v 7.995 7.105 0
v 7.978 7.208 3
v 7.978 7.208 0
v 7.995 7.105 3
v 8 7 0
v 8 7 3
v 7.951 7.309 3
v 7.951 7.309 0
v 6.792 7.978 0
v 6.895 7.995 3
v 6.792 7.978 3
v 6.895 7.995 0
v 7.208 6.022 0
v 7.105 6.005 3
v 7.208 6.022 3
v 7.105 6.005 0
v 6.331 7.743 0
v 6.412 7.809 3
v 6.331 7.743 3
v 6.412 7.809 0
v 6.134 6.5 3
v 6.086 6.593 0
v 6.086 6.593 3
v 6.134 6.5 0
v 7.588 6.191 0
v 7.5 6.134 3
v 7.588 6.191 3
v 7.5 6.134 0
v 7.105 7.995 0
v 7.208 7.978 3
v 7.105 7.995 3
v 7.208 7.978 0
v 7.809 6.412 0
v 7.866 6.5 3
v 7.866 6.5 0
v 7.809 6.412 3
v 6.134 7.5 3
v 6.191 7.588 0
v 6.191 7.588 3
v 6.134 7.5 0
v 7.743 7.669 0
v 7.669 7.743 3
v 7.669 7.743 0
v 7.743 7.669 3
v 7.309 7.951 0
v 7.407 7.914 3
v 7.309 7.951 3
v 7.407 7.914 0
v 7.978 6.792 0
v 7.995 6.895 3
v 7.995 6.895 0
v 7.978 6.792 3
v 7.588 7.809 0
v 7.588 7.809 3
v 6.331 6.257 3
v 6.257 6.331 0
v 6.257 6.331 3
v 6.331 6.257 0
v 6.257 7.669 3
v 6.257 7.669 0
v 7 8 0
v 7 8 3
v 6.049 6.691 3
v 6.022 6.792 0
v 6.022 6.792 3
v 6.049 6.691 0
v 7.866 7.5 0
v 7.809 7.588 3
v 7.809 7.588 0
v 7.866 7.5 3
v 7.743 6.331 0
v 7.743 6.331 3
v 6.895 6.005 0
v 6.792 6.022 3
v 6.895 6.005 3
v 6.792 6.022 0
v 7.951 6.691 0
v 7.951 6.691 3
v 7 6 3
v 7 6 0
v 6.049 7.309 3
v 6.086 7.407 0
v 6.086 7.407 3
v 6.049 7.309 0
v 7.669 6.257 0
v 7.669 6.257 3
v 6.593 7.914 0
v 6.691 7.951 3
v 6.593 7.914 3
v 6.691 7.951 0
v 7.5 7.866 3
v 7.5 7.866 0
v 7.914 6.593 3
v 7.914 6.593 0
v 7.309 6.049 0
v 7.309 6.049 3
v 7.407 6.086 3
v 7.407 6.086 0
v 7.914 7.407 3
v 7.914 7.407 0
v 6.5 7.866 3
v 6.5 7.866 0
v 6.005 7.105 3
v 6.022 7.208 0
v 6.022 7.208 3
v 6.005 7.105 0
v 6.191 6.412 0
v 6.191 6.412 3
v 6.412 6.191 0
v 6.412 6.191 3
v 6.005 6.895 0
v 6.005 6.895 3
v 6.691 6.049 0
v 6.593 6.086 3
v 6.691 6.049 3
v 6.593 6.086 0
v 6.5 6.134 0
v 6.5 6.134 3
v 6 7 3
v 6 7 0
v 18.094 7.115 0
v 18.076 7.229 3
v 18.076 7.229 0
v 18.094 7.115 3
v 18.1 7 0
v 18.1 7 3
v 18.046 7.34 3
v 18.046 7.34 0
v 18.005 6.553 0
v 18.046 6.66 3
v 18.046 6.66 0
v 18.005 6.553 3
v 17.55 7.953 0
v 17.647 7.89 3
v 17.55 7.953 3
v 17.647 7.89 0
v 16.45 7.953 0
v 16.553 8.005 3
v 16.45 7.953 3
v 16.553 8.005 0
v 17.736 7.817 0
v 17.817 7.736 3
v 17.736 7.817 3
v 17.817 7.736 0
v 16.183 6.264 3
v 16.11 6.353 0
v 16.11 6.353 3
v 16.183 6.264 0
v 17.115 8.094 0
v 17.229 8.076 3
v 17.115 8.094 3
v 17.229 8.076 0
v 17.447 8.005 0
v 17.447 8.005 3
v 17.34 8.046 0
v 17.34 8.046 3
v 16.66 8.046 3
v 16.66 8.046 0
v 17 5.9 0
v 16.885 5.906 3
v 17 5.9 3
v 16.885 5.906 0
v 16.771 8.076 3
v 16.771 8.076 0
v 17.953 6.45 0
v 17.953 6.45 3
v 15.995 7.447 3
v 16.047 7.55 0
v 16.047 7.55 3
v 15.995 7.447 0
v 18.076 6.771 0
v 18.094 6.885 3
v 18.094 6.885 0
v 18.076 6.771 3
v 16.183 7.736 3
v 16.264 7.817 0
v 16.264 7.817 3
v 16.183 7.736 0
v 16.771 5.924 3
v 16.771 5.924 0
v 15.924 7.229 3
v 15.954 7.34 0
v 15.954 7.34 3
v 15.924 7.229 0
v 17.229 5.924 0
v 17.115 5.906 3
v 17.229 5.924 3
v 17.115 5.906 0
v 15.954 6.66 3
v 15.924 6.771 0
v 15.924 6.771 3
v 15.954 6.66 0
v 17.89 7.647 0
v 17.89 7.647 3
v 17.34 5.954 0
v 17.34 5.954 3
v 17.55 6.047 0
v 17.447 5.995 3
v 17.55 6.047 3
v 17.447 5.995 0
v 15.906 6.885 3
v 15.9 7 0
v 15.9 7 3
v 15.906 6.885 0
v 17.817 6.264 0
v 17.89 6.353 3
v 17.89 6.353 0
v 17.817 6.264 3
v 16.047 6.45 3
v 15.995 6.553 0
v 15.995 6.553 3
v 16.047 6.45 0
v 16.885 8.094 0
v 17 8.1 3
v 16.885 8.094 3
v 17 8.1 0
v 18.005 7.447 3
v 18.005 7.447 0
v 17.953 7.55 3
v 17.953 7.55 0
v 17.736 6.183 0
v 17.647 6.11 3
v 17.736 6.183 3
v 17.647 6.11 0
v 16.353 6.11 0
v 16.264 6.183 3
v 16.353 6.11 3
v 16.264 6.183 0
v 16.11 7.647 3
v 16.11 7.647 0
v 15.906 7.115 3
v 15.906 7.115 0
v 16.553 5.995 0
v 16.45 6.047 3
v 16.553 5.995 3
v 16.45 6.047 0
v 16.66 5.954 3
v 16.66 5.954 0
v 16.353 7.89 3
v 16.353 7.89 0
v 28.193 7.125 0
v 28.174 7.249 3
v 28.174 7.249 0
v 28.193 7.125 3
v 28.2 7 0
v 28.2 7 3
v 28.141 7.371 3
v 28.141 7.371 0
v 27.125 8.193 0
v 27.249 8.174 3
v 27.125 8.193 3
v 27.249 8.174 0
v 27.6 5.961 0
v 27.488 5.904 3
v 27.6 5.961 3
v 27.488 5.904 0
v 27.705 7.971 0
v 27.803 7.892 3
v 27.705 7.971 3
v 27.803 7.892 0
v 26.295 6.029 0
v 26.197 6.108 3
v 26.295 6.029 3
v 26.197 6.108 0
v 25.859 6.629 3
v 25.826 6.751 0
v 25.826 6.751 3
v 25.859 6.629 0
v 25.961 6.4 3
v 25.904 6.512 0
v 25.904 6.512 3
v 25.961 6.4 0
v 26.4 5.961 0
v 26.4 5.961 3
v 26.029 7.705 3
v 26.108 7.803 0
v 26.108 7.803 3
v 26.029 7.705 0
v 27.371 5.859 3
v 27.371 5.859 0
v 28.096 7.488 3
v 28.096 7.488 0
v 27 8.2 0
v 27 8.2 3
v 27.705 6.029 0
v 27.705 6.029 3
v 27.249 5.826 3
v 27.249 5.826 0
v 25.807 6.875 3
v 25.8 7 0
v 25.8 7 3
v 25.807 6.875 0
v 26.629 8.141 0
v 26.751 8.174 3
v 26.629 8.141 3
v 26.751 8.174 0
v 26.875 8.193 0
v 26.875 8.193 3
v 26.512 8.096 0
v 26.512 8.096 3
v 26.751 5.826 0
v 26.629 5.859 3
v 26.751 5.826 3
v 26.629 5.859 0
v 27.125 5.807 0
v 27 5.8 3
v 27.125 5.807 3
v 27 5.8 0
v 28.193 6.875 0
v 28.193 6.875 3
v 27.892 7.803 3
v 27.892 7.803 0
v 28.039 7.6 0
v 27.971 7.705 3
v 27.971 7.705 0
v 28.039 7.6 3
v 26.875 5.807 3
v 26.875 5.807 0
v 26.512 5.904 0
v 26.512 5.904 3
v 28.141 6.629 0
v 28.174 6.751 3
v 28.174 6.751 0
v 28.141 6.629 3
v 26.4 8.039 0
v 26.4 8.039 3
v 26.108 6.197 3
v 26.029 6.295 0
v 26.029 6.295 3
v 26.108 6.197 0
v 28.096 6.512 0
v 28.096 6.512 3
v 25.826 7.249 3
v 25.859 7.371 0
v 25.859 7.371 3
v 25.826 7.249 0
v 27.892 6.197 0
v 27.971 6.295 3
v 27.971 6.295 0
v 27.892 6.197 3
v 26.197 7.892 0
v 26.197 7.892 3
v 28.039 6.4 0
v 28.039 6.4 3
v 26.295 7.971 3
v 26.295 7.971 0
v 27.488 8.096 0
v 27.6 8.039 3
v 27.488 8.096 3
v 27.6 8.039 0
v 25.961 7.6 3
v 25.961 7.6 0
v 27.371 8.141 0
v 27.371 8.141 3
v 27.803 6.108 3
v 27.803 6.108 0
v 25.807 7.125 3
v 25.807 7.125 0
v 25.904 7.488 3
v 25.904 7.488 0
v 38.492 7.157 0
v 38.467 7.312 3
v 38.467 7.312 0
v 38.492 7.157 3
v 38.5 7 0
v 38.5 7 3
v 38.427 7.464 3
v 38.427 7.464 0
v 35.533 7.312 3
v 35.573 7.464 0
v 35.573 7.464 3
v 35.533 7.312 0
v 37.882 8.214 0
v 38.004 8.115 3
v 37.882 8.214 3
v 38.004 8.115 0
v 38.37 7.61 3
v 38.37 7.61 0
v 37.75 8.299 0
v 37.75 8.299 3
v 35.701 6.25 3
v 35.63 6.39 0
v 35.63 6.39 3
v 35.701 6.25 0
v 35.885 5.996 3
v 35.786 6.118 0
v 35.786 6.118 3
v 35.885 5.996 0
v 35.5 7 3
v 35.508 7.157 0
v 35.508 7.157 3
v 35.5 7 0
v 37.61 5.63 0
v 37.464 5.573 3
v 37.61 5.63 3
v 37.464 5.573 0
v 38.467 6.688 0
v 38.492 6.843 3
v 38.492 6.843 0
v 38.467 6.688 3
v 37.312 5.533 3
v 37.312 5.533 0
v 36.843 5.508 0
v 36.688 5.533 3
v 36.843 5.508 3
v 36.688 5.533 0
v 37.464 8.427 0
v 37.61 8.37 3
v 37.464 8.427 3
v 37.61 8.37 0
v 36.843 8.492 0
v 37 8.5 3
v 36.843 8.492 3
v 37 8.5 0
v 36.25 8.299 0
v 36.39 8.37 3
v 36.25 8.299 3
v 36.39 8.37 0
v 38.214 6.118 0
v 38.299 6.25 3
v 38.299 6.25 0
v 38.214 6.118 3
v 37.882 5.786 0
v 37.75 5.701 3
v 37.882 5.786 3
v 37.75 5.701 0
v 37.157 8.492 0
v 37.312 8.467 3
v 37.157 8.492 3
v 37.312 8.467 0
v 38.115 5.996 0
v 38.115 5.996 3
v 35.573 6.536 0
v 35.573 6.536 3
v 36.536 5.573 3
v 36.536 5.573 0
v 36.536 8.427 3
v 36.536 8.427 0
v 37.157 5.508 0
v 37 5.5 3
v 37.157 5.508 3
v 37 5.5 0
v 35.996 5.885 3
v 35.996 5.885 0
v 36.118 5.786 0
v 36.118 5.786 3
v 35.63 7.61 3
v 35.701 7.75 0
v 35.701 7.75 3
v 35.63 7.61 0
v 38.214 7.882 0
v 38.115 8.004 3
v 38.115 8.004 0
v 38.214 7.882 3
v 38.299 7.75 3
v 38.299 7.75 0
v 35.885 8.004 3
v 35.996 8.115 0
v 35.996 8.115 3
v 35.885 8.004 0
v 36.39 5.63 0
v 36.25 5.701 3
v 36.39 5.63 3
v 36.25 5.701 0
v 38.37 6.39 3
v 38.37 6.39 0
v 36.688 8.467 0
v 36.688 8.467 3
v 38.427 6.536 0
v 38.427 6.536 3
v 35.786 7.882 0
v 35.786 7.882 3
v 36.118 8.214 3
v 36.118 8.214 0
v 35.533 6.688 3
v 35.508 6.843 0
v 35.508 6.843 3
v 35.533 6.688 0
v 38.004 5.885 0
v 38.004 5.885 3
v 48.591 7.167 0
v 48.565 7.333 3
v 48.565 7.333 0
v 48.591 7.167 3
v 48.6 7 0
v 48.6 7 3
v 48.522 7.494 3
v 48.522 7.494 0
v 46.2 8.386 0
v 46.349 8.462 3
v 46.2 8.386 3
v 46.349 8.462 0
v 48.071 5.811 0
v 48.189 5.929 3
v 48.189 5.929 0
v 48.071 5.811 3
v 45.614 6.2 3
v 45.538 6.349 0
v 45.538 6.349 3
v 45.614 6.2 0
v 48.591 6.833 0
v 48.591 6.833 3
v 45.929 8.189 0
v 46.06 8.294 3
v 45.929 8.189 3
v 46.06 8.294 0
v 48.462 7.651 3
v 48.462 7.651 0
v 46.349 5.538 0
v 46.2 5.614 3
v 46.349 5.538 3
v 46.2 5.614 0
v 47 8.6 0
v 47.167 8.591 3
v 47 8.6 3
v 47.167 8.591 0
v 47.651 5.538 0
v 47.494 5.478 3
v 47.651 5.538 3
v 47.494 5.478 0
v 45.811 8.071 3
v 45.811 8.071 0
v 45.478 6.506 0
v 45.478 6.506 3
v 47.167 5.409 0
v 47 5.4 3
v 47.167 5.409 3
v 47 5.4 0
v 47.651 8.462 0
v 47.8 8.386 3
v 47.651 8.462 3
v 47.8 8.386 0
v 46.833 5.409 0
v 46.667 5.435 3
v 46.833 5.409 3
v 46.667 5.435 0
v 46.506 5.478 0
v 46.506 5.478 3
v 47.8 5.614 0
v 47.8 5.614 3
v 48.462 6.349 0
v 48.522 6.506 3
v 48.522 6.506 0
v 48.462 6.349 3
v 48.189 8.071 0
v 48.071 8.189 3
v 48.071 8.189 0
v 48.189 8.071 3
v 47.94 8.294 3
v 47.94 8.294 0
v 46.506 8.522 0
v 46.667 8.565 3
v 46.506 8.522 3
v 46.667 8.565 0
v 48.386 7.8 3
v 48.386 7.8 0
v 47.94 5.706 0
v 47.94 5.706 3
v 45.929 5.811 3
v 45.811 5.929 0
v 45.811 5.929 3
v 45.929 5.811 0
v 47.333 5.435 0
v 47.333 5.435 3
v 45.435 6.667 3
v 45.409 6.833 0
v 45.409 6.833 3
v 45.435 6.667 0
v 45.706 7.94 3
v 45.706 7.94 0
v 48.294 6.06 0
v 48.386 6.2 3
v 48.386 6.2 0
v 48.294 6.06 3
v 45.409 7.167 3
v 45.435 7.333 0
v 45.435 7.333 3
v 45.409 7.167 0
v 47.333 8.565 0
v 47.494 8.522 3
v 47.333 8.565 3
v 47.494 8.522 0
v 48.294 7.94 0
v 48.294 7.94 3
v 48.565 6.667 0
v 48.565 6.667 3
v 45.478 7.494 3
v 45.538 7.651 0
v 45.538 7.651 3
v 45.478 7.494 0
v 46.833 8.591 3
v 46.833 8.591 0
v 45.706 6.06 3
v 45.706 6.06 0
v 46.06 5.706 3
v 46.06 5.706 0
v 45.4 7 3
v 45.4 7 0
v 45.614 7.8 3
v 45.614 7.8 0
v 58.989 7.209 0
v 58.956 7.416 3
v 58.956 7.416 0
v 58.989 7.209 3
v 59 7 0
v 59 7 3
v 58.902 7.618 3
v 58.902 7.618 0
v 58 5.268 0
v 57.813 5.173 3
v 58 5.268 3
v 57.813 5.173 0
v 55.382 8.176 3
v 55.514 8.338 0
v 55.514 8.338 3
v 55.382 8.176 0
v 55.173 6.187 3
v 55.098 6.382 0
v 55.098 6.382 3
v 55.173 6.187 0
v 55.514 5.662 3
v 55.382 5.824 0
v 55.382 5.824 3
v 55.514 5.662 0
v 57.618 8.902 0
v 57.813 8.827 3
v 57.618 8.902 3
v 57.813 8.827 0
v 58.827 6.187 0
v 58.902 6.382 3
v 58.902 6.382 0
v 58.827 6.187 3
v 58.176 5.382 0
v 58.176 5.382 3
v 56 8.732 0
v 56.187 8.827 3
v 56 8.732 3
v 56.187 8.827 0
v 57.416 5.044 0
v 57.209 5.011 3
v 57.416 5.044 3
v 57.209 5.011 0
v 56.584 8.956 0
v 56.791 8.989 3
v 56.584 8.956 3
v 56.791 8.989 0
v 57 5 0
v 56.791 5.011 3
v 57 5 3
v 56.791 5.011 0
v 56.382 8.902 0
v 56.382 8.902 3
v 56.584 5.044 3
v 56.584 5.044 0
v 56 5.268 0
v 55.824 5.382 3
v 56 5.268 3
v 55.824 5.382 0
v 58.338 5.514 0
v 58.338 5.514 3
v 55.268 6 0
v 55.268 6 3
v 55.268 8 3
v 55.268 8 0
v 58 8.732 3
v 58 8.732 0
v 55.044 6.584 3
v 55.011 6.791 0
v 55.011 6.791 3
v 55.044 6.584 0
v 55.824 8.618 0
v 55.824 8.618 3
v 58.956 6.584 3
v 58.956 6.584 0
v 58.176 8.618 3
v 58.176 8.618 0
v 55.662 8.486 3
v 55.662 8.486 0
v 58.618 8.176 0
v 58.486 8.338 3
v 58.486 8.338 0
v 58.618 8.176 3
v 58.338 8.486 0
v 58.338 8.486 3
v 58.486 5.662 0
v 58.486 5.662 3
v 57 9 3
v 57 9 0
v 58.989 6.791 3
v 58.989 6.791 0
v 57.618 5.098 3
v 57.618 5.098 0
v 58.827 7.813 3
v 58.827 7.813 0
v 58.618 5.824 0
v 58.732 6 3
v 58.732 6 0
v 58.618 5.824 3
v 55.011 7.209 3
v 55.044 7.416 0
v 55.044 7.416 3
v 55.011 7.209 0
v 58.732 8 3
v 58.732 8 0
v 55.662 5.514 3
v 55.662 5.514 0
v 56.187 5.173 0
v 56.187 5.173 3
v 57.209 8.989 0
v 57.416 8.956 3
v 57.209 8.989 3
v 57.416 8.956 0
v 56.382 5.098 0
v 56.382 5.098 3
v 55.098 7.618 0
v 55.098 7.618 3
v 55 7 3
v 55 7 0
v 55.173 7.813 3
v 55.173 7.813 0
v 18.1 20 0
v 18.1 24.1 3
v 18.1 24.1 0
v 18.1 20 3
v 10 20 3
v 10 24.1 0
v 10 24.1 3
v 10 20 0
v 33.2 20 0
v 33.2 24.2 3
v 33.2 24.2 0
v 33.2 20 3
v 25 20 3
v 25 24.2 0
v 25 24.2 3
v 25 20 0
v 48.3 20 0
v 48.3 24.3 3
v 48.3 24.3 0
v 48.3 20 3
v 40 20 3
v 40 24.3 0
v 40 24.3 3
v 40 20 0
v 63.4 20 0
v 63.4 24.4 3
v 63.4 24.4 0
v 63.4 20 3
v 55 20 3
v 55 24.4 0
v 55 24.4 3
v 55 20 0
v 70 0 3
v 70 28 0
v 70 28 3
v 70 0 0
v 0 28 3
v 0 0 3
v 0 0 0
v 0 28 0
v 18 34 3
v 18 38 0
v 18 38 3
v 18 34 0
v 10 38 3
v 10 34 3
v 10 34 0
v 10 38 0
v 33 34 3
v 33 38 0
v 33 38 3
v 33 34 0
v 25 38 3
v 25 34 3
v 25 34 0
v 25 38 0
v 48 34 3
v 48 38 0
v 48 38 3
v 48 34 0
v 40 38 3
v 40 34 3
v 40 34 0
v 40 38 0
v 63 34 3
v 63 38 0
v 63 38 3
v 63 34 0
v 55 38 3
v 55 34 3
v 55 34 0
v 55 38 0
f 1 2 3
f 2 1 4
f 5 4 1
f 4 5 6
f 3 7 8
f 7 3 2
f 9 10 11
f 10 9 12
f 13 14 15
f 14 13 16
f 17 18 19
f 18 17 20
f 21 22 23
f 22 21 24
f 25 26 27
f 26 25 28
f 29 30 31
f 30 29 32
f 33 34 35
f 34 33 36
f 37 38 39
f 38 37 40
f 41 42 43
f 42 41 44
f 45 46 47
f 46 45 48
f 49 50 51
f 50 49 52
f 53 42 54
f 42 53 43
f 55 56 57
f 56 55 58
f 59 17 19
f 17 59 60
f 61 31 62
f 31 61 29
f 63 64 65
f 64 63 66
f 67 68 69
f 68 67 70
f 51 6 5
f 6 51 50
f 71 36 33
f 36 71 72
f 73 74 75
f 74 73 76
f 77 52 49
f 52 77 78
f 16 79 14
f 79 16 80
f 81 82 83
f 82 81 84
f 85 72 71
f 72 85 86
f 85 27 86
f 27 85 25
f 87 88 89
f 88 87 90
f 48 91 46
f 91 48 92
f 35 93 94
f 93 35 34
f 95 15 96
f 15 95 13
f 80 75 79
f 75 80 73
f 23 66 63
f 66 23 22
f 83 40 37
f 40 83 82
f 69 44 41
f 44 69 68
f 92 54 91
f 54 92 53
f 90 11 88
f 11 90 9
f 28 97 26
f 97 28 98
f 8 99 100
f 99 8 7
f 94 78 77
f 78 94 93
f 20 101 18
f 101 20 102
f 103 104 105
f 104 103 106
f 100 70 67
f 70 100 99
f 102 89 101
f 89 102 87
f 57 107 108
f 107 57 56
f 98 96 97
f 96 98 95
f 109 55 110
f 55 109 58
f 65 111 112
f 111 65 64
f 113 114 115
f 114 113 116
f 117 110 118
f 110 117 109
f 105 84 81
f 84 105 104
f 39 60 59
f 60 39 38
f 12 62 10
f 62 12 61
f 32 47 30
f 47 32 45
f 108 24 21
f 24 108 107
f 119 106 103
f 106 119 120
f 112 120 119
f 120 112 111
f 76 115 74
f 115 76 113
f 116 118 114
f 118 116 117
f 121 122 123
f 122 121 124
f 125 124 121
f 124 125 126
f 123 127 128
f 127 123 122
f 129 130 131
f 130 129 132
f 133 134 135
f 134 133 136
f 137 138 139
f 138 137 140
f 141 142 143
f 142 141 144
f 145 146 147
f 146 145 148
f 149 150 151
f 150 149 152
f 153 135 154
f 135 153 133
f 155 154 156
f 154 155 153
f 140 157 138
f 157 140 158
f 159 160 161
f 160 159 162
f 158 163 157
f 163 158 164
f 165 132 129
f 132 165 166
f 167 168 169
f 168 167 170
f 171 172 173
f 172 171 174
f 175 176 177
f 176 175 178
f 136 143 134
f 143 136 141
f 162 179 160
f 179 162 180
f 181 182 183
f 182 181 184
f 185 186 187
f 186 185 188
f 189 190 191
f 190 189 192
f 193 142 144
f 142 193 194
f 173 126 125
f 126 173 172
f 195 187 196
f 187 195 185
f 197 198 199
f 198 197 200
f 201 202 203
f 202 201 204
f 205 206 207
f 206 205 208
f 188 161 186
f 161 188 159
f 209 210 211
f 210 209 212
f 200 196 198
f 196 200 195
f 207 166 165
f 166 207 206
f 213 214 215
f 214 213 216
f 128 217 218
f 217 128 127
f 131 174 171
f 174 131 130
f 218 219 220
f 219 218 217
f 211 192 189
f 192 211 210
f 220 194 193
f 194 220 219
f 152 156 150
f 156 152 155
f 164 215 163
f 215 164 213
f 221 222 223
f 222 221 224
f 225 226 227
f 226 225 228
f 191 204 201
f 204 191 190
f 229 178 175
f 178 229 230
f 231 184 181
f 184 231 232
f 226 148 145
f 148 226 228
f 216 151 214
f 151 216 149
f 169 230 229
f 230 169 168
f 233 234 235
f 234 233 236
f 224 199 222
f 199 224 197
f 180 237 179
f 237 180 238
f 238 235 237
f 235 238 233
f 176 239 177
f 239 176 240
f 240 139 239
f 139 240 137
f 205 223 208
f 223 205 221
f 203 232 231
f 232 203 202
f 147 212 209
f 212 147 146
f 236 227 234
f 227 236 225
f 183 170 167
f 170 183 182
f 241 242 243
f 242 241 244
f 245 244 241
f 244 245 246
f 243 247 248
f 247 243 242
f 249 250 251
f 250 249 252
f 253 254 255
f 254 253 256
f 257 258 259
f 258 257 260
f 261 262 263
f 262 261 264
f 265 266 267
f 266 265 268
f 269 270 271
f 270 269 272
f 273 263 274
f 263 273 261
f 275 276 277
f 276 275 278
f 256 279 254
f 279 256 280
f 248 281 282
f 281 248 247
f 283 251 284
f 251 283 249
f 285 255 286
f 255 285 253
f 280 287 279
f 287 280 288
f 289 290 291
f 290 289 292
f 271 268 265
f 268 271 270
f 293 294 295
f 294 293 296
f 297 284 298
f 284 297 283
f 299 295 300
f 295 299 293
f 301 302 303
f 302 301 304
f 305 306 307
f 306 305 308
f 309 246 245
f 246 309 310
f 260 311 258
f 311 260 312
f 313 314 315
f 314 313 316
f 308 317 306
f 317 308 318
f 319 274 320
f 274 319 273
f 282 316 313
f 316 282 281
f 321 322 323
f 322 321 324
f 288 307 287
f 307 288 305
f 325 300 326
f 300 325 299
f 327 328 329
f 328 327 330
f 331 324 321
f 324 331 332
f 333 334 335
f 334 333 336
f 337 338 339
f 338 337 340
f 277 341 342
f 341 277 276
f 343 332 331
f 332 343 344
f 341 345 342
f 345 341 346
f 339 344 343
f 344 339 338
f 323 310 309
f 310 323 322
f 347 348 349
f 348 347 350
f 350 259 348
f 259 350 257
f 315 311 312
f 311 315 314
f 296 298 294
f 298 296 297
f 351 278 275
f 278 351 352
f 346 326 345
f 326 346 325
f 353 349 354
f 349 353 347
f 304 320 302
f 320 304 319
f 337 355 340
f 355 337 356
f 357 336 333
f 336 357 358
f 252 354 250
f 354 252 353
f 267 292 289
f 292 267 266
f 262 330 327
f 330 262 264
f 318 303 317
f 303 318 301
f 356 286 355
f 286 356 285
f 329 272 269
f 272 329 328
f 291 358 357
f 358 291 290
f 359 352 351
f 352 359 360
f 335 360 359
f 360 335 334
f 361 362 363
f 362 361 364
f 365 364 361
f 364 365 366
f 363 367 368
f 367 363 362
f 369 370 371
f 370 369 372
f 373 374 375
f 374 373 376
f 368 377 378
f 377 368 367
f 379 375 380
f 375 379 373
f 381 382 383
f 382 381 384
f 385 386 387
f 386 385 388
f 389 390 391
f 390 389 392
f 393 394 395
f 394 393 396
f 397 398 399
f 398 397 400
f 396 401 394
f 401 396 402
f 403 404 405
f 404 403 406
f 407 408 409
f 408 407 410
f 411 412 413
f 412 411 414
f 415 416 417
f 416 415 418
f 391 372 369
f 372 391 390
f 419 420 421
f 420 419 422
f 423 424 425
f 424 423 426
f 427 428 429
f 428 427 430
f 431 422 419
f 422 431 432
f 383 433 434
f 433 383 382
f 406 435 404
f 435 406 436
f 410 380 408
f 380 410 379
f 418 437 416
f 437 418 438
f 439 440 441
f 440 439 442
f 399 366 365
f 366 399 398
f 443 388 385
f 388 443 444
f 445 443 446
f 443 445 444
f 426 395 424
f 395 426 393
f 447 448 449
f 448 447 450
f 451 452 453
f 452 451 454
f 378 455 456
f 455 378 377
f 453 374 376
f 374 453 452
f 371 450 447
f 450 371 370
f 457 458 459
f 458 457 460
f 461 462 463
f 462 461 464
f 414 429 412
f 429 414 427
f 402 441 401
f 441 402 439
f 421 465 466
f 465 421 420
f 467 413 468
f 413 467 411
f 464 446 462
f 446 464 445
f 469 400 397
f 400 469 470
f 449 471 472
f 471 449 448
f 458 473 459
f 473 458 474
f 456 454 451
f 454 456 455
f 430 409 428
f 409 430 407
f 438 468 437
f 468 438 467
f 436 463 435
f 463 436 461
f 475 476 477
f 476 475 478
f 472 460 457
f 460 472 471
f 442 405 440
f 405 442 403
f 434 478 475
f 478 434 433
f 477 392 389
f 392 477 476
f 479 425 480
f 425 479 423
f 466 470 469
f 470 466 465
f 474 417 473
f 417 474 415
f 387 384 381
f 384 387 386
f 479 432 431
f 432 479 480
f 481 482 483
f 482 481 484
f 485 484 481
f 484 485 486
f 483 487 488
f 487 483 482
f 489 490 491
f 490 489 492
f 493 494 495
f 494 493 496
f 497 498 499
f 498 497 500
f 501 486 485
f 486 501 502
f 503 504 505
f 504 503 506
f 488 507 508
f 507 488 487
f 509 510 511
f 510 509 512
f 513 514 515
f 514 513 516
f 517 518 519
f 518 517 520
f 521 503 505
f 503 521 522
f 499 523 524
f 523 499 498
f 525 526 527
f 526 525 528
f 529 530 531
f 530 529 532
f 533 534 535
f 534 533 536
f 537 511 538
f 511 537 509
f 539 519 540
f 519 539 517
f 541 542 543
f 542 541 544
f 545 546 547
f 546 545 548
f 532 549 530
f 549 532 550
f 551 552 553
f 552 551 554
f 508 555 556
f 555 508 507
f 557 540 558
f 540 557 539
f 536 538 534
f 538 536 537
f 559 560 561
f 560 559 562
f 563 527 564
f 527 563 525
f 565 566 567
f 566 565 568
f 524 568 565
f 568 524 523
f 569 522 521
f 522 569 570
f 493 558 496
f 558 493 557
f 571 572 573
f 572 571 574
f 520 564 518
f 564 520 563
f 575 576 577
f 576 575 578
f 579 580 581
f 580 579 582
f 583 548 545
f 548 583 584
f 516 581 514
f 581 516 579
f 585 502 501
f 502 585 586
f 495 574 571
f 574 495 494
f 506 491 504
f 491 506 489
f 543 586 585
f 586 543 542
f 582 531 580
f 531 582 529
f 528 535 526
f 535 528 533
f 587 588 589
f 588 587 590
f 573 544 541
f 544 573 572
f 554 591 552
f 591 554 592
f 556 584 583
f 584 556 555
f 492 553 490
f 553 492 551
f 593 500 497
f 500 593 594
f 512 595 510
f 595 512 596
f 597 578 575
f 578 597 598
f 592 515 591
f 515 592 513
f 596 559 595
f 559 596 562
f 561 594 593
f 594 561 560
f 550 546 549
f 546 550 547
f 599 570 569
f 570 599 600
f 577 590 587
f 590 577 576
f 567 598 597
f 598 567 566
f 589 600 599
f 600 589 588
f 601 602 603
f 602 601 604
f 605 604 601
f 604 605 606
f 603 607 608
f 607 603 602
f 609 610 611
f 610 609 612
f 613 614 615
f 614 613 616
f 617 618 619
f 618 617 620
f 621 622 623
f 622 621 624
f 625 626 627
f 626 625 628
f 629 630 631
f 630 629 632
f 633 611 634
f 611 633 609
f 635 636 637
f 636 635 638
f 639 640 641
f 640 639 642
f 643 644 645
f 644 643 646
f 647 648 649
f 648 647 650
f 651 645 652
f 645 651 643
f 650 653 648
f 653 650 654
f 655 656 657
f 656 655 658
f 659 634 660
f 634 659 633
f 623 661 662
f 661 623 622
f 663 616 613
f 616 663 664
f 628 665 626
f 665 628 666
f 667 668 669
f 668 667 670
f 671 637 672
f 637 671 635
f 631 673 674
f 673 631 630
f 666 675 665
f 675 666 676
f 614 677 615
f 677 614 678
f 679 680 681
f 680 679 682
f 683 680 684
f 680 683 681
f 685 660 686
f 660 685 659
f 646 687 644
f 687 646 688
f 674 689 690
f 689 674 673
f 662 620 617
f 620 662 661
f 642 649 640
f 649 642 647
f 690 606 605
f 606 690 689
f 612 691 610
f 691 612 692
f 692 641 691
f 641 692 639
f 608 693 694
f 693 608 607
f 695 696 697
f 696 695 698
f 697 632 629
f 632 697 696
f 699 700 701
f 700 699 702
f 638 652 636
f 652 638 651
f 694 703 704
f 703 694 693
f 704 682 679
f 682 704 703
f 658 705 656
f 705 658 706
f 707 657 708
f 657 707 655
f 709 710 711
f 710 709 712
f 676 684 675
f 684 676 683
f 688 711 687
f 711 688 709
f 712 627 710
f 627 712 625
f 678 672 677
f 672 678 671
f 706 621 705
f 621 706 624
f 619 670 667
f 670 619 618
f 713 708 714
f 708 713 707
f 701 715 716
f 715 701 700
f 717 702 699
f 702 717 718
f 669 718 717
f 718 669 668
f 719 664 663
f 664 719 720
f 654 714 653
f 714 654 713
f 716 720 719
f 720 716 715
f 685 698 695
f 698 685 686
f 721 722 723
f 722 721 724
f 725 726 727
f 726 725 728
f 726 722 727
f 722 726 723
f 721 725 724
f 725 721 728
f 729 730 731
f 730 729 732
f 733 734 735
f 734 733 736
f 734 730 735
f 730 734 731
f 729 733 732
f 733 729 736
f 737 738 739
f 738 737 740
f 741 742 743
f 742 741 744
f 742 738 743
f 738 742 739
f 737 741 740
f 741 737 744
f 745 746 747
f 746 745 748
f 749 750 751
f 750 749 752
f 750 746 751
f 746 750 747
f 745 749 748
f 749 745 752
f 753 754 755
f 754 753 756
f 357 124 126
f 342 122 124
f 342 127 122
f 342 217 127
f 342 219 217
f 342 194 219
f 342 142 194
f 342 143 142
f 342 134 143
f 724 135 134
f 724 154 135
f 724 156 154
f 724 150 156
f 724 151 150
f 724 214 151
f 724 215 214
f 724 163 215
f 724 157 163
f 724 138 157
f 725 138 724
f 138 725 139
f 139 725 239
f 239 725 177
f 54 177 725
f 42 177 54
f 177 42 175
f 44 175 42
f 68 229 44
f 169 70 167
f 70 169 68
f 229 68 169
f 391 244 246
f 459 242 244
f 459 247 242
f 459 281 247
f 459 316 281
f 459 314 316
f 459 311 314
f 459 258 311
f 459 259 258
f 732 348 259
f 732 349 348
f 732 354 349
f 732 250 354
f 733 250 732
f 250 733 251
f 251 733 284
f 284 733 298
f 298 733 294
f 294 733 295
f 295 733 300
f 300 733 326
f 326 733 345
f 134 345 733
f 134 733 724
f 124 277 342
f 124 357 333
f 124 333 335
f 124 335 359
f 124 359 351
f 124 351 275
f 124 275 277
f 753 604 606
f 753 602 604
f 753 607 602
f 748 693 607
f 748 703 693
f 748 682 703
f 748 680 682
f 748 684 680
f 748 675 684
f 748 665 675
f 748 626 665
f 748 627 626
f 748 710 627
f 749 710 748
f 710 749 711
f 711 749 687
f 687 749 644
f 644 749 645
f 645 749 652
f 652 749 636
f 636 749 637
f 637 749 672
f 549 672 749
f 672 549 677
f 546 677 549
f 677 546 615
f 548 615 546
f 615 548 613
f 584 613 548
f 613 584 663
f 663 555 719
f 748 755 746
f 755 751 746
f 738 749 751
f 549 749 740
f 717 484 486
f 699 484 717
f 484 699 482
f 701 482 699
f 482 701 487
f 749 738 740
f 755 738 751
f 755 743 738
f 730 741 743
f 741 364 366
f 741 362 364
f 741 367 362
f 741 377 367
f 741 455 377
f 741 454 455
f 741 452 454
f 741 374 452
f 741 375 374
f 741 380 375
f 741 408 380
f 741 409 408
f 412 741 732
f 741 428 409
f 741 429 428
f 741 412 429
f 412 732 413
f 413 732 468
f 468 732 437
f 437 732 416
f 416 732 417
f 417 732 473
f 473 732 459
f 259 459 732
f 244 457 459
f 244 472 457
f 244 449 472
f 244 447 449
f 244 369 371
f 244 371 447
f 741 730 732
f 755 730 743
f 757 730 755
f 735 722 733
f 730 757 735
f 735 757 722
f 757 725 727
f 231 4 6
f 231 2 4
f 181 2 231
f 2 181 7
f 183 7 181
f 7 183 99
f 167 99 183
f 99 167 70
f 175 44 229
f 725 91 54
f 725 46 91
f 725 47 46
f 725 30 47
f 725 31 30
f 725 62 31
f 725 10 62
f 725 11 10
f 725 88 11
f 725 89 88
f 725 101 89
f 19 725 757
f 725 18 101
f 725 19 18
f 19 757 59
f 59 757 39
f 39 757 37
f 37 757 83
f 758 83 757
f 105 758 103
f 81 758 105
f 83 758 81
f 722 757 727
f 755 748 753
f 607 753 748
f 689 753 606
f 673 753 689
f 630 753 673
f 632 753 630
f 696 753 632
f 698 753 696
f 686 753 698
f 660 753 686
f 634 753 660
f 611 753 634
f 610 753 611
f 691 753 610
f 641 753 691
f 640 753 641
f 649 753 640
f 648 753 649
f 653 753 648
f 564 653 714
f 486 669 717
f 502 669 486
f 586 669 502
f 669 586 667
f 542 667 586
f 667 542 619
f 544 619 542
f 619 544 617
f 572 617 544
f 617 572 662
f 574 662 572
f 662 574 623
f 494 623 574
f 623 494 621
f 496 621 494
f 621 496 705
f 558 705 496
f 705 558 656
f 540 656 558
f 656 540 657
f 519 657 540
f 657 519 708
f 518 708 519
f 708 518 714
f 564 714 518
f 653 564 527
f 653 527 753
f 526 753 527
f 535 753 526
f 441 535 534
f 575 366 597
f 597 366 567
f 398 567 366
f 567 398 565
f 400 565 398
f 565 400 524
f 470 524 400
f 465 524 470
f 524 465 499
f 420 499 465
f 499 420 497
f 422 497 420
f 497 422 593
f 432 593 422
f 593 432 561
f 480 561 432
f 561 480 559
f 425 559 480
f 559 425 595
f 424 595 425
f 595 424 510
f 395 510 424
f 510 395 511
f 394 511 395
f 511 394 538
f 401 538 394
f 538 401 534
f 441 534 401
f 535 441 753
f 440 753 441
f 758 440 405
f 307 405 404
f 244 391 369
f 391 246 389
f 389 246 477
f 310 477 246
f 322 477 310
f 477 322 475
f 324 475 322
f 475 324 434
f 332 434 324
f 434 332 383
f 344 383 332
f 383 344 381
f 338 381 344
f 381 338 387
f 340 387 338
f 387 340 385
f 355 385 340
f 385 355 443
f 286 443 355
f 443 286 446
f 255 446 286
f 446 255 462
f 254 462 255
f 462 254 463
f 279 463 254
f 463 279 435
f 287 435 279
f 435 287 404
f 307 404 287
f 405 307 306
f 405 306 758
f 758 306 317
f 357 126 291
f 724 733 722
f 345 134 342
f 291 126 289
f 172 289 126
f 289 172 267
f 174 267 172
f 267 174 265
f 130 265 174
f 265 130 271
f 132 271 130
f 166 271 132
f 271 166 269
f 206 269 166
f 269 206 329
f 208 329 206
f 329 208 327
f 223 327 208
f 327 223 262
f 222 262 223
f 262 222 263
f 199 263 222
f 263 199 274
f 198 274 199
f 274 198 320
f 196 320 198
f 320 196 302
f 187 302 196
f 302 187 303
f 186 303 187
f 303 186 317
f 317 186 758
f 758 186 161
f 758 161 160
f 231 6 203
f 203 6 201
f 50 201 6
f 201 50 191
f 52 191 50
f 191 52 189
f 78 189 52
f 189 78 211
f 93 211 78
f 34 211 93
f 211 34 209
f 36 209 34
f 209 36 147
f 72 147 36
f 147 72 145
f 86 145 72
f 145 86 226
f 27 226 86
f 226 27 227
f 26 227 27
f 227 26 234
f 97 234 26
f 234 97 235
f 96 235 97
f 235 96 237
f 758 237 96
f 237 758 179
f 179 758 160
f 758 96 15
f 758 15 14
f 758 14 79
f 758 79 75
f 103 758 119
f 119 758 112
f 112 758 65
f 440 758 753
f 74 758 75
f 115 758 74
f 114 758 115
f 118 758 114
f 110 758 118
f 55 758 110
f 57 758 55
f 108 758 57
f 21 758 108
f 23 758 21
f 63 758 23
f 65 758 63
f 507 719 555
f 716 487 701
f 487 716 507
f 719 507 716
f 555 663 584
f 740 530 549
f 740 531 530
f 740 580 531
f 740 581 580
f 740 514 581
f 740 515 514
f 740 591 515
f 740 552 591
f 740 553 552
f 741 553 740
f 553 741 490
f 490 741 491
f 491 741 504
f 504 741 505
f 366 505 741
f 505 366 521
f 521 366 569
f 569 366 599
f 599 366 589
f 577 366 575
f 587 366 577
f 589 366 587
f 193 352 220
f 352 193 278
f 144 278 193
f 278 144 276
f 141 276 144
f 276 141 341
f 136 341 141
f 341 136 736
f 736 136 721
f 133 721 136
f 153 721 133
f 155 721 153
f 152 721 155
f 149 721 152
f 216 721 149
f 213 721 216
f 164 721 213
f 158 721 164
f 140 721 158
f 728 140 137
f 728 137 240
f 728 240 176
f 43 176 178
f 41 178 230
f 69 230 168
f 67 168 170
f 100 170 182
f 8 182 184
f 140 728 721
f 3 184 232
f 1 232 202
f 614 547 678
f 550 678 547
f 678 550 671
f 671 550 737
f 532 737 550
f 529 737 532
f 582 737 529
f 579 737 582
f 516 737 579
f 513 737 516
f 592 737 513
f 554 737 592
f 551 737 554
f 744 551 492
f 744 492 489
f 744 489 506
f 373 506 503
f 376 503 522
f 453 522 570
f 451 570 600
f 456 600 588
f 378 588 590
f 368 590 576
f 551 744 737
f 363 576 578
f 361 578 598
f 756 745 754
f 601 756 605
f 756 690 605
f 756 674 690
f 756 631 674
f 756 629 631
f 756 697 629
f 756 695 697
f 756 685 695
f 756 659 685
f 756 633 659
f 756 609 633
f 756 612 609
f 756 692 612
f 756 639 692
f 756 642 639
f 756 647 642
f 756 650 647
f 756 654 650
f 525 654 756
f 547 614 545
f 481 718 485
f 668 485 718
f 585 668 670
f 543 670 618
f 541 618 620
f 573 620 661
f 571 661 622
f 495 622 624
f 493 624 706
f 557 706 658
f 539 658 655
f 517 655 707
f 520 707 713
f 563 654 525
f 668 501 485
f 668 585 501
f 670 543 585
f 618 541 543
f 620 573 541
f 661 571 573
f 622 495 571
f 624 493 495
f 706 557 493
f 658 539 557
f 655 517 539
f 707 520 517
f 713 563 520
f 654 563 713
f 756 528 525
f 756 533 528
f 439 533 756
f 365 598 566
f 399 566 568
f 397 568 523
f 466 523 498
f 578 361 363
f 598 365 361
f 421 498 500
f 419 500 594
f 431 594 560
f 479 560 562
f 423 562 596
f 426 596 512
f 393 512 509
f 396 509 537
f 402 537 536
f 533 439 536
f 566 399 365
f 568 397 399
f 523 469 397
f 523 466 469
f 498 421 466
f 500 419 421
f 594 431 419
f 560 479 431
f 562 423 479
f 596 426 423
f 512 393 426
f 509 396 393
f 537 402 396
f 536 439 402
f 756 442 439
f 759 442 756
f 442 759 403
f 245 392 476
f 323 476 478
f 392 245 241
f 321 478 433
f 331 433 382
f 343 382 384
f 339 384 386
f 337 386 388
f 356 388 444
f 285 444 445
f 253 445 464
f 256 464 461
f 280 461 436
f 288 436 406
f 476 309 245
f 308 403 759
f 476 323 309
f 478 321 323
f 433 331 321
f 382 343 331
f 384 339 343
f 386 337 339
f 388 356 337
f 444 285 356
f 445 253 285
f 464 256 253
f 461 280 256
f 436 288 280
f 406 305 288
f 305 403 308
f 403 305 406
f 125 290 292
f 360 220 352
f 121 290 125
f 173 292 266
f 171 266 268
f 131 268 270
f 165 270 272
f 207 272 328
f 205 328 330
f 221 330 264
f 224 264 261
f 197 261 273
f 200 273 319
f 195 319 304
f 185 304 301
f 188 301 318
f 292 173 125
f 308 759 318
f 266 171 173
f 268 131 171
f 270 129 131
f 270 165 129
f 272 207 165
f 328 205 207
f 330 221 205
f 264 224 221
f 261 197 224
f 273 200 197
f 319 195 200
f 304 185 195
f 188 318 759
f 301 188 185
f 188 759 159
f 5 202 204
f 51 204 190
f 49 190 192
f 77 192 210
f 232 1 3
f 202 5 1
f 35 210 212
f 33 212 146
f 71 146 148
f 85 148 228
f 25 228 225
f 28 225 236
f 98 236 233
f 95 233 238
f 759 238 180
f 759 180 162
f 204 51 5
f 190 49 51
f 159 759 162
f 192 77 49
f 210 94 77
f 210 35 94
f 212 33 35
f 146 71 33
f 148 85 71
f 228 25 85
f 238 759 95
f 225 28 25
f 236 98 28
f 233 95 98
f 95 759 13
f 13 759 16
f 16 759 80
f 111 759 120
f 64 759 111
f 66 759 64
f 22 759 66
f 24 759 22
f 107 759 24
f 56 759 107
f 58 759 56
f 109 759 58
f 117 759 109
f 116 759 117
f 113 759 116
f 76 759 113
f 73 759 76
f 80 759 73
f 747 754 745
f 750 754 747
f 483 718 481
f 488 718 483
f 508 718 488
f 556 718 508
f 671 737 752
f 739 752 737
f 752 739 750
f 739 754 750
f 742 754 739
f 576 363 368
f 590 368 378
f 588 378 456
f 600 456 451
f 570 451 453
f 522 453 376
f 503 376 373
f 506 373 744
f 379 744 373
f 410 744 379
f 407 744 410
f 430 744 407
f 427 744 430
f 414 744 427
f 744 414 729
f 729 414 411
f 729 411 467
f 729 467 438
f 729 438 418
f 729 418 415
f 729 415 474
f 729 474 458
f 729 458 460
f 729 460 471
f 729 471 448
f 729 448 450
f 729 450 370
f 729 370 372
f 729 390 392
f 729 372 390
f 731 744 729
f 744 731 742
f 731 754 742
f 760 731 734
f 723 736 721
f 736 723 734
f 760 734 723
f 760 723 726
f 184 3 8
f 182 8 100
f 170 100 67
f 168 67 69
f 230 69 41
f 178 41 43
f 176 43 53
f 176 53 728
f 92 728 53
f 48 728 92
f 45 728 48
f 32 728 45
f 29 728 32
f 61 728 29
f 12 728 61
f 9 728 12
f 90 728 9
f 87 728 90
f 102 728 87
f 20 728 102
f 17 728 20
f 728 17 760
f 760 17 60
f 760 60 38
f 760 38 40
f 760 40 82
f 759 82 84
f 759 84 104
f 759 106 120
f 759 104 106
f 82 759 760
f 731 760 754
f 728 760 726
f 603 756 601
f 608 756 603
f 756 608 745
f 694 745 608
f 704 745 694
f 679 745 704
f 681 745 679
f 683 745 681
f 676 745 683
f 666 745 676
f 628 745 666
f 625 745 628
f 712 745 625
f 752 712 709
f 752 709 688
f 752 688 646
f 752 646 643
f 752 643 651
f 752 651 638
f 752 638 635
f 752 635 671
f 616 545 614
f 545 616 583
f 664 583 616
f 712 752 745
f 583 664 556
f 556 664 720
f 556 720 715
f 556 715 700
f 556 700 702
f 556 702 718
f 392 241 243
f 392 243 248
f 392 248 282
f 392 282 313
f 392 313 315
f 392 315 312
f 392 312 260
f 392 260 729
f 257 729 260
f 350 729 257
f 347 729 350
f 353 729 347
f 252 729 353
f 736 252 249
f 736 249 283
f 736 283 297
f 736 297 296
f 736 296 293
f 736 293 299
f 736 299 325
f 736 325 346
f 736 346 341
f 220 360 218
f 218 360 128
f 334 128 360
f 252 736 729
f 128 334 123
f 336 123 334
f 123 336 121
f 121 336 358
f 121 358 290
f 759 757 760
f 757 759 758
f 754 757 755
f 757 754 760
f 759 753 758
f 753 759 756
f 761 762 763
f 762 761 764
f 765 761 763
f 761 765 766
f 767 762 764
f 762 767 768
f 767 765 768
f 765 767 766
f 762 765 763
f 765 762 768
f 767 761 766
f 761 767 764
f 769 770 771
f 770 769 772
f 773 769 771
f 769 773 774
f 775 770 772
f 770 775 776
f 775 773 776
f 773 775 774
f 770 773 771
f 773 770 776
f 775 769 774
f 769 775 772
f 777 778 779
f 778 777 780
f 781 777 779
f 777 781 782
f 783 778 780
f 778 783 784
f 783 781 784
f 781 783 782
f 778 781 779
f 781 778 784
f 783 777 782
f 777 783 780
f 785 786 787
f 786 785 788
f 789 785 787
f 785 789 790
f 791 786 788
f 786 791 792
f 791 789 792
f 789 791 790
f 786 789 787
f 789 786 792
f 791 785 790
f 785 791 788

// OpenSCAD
/* BUDDY FILE61 - FDM FIT CALIBRATION COUPON
Print before structural parts. Measures actual pin/hole and sliding-fit behavior. */
$fn=60; BASE=[70,28,3]; nominal=[2.0,2.2,2.4,3.0,3.2,4.0]; clearances=[0.10,0.20,0.30,0.40];
difference(){cube(BASE);for(i=[0:len(nominal)-1])translate([7+i*10,7,-.1])cylinder(h=4,d=nominal[i]);for(i=[0:len(clearances)-1])translate([10+i*15,20,-.1])cube([8+clearances[i],4+clearances[i],4]);}
for(i=[0:len(clearances)-1])translate([10+i*15,34,0])cube([8,4,3]);
echo("FILE61 calibration coupon: measure printed holes and test slide bars");
echo("Do not transfer nominal PROCESS clearances into production until coupon results are recorded");
